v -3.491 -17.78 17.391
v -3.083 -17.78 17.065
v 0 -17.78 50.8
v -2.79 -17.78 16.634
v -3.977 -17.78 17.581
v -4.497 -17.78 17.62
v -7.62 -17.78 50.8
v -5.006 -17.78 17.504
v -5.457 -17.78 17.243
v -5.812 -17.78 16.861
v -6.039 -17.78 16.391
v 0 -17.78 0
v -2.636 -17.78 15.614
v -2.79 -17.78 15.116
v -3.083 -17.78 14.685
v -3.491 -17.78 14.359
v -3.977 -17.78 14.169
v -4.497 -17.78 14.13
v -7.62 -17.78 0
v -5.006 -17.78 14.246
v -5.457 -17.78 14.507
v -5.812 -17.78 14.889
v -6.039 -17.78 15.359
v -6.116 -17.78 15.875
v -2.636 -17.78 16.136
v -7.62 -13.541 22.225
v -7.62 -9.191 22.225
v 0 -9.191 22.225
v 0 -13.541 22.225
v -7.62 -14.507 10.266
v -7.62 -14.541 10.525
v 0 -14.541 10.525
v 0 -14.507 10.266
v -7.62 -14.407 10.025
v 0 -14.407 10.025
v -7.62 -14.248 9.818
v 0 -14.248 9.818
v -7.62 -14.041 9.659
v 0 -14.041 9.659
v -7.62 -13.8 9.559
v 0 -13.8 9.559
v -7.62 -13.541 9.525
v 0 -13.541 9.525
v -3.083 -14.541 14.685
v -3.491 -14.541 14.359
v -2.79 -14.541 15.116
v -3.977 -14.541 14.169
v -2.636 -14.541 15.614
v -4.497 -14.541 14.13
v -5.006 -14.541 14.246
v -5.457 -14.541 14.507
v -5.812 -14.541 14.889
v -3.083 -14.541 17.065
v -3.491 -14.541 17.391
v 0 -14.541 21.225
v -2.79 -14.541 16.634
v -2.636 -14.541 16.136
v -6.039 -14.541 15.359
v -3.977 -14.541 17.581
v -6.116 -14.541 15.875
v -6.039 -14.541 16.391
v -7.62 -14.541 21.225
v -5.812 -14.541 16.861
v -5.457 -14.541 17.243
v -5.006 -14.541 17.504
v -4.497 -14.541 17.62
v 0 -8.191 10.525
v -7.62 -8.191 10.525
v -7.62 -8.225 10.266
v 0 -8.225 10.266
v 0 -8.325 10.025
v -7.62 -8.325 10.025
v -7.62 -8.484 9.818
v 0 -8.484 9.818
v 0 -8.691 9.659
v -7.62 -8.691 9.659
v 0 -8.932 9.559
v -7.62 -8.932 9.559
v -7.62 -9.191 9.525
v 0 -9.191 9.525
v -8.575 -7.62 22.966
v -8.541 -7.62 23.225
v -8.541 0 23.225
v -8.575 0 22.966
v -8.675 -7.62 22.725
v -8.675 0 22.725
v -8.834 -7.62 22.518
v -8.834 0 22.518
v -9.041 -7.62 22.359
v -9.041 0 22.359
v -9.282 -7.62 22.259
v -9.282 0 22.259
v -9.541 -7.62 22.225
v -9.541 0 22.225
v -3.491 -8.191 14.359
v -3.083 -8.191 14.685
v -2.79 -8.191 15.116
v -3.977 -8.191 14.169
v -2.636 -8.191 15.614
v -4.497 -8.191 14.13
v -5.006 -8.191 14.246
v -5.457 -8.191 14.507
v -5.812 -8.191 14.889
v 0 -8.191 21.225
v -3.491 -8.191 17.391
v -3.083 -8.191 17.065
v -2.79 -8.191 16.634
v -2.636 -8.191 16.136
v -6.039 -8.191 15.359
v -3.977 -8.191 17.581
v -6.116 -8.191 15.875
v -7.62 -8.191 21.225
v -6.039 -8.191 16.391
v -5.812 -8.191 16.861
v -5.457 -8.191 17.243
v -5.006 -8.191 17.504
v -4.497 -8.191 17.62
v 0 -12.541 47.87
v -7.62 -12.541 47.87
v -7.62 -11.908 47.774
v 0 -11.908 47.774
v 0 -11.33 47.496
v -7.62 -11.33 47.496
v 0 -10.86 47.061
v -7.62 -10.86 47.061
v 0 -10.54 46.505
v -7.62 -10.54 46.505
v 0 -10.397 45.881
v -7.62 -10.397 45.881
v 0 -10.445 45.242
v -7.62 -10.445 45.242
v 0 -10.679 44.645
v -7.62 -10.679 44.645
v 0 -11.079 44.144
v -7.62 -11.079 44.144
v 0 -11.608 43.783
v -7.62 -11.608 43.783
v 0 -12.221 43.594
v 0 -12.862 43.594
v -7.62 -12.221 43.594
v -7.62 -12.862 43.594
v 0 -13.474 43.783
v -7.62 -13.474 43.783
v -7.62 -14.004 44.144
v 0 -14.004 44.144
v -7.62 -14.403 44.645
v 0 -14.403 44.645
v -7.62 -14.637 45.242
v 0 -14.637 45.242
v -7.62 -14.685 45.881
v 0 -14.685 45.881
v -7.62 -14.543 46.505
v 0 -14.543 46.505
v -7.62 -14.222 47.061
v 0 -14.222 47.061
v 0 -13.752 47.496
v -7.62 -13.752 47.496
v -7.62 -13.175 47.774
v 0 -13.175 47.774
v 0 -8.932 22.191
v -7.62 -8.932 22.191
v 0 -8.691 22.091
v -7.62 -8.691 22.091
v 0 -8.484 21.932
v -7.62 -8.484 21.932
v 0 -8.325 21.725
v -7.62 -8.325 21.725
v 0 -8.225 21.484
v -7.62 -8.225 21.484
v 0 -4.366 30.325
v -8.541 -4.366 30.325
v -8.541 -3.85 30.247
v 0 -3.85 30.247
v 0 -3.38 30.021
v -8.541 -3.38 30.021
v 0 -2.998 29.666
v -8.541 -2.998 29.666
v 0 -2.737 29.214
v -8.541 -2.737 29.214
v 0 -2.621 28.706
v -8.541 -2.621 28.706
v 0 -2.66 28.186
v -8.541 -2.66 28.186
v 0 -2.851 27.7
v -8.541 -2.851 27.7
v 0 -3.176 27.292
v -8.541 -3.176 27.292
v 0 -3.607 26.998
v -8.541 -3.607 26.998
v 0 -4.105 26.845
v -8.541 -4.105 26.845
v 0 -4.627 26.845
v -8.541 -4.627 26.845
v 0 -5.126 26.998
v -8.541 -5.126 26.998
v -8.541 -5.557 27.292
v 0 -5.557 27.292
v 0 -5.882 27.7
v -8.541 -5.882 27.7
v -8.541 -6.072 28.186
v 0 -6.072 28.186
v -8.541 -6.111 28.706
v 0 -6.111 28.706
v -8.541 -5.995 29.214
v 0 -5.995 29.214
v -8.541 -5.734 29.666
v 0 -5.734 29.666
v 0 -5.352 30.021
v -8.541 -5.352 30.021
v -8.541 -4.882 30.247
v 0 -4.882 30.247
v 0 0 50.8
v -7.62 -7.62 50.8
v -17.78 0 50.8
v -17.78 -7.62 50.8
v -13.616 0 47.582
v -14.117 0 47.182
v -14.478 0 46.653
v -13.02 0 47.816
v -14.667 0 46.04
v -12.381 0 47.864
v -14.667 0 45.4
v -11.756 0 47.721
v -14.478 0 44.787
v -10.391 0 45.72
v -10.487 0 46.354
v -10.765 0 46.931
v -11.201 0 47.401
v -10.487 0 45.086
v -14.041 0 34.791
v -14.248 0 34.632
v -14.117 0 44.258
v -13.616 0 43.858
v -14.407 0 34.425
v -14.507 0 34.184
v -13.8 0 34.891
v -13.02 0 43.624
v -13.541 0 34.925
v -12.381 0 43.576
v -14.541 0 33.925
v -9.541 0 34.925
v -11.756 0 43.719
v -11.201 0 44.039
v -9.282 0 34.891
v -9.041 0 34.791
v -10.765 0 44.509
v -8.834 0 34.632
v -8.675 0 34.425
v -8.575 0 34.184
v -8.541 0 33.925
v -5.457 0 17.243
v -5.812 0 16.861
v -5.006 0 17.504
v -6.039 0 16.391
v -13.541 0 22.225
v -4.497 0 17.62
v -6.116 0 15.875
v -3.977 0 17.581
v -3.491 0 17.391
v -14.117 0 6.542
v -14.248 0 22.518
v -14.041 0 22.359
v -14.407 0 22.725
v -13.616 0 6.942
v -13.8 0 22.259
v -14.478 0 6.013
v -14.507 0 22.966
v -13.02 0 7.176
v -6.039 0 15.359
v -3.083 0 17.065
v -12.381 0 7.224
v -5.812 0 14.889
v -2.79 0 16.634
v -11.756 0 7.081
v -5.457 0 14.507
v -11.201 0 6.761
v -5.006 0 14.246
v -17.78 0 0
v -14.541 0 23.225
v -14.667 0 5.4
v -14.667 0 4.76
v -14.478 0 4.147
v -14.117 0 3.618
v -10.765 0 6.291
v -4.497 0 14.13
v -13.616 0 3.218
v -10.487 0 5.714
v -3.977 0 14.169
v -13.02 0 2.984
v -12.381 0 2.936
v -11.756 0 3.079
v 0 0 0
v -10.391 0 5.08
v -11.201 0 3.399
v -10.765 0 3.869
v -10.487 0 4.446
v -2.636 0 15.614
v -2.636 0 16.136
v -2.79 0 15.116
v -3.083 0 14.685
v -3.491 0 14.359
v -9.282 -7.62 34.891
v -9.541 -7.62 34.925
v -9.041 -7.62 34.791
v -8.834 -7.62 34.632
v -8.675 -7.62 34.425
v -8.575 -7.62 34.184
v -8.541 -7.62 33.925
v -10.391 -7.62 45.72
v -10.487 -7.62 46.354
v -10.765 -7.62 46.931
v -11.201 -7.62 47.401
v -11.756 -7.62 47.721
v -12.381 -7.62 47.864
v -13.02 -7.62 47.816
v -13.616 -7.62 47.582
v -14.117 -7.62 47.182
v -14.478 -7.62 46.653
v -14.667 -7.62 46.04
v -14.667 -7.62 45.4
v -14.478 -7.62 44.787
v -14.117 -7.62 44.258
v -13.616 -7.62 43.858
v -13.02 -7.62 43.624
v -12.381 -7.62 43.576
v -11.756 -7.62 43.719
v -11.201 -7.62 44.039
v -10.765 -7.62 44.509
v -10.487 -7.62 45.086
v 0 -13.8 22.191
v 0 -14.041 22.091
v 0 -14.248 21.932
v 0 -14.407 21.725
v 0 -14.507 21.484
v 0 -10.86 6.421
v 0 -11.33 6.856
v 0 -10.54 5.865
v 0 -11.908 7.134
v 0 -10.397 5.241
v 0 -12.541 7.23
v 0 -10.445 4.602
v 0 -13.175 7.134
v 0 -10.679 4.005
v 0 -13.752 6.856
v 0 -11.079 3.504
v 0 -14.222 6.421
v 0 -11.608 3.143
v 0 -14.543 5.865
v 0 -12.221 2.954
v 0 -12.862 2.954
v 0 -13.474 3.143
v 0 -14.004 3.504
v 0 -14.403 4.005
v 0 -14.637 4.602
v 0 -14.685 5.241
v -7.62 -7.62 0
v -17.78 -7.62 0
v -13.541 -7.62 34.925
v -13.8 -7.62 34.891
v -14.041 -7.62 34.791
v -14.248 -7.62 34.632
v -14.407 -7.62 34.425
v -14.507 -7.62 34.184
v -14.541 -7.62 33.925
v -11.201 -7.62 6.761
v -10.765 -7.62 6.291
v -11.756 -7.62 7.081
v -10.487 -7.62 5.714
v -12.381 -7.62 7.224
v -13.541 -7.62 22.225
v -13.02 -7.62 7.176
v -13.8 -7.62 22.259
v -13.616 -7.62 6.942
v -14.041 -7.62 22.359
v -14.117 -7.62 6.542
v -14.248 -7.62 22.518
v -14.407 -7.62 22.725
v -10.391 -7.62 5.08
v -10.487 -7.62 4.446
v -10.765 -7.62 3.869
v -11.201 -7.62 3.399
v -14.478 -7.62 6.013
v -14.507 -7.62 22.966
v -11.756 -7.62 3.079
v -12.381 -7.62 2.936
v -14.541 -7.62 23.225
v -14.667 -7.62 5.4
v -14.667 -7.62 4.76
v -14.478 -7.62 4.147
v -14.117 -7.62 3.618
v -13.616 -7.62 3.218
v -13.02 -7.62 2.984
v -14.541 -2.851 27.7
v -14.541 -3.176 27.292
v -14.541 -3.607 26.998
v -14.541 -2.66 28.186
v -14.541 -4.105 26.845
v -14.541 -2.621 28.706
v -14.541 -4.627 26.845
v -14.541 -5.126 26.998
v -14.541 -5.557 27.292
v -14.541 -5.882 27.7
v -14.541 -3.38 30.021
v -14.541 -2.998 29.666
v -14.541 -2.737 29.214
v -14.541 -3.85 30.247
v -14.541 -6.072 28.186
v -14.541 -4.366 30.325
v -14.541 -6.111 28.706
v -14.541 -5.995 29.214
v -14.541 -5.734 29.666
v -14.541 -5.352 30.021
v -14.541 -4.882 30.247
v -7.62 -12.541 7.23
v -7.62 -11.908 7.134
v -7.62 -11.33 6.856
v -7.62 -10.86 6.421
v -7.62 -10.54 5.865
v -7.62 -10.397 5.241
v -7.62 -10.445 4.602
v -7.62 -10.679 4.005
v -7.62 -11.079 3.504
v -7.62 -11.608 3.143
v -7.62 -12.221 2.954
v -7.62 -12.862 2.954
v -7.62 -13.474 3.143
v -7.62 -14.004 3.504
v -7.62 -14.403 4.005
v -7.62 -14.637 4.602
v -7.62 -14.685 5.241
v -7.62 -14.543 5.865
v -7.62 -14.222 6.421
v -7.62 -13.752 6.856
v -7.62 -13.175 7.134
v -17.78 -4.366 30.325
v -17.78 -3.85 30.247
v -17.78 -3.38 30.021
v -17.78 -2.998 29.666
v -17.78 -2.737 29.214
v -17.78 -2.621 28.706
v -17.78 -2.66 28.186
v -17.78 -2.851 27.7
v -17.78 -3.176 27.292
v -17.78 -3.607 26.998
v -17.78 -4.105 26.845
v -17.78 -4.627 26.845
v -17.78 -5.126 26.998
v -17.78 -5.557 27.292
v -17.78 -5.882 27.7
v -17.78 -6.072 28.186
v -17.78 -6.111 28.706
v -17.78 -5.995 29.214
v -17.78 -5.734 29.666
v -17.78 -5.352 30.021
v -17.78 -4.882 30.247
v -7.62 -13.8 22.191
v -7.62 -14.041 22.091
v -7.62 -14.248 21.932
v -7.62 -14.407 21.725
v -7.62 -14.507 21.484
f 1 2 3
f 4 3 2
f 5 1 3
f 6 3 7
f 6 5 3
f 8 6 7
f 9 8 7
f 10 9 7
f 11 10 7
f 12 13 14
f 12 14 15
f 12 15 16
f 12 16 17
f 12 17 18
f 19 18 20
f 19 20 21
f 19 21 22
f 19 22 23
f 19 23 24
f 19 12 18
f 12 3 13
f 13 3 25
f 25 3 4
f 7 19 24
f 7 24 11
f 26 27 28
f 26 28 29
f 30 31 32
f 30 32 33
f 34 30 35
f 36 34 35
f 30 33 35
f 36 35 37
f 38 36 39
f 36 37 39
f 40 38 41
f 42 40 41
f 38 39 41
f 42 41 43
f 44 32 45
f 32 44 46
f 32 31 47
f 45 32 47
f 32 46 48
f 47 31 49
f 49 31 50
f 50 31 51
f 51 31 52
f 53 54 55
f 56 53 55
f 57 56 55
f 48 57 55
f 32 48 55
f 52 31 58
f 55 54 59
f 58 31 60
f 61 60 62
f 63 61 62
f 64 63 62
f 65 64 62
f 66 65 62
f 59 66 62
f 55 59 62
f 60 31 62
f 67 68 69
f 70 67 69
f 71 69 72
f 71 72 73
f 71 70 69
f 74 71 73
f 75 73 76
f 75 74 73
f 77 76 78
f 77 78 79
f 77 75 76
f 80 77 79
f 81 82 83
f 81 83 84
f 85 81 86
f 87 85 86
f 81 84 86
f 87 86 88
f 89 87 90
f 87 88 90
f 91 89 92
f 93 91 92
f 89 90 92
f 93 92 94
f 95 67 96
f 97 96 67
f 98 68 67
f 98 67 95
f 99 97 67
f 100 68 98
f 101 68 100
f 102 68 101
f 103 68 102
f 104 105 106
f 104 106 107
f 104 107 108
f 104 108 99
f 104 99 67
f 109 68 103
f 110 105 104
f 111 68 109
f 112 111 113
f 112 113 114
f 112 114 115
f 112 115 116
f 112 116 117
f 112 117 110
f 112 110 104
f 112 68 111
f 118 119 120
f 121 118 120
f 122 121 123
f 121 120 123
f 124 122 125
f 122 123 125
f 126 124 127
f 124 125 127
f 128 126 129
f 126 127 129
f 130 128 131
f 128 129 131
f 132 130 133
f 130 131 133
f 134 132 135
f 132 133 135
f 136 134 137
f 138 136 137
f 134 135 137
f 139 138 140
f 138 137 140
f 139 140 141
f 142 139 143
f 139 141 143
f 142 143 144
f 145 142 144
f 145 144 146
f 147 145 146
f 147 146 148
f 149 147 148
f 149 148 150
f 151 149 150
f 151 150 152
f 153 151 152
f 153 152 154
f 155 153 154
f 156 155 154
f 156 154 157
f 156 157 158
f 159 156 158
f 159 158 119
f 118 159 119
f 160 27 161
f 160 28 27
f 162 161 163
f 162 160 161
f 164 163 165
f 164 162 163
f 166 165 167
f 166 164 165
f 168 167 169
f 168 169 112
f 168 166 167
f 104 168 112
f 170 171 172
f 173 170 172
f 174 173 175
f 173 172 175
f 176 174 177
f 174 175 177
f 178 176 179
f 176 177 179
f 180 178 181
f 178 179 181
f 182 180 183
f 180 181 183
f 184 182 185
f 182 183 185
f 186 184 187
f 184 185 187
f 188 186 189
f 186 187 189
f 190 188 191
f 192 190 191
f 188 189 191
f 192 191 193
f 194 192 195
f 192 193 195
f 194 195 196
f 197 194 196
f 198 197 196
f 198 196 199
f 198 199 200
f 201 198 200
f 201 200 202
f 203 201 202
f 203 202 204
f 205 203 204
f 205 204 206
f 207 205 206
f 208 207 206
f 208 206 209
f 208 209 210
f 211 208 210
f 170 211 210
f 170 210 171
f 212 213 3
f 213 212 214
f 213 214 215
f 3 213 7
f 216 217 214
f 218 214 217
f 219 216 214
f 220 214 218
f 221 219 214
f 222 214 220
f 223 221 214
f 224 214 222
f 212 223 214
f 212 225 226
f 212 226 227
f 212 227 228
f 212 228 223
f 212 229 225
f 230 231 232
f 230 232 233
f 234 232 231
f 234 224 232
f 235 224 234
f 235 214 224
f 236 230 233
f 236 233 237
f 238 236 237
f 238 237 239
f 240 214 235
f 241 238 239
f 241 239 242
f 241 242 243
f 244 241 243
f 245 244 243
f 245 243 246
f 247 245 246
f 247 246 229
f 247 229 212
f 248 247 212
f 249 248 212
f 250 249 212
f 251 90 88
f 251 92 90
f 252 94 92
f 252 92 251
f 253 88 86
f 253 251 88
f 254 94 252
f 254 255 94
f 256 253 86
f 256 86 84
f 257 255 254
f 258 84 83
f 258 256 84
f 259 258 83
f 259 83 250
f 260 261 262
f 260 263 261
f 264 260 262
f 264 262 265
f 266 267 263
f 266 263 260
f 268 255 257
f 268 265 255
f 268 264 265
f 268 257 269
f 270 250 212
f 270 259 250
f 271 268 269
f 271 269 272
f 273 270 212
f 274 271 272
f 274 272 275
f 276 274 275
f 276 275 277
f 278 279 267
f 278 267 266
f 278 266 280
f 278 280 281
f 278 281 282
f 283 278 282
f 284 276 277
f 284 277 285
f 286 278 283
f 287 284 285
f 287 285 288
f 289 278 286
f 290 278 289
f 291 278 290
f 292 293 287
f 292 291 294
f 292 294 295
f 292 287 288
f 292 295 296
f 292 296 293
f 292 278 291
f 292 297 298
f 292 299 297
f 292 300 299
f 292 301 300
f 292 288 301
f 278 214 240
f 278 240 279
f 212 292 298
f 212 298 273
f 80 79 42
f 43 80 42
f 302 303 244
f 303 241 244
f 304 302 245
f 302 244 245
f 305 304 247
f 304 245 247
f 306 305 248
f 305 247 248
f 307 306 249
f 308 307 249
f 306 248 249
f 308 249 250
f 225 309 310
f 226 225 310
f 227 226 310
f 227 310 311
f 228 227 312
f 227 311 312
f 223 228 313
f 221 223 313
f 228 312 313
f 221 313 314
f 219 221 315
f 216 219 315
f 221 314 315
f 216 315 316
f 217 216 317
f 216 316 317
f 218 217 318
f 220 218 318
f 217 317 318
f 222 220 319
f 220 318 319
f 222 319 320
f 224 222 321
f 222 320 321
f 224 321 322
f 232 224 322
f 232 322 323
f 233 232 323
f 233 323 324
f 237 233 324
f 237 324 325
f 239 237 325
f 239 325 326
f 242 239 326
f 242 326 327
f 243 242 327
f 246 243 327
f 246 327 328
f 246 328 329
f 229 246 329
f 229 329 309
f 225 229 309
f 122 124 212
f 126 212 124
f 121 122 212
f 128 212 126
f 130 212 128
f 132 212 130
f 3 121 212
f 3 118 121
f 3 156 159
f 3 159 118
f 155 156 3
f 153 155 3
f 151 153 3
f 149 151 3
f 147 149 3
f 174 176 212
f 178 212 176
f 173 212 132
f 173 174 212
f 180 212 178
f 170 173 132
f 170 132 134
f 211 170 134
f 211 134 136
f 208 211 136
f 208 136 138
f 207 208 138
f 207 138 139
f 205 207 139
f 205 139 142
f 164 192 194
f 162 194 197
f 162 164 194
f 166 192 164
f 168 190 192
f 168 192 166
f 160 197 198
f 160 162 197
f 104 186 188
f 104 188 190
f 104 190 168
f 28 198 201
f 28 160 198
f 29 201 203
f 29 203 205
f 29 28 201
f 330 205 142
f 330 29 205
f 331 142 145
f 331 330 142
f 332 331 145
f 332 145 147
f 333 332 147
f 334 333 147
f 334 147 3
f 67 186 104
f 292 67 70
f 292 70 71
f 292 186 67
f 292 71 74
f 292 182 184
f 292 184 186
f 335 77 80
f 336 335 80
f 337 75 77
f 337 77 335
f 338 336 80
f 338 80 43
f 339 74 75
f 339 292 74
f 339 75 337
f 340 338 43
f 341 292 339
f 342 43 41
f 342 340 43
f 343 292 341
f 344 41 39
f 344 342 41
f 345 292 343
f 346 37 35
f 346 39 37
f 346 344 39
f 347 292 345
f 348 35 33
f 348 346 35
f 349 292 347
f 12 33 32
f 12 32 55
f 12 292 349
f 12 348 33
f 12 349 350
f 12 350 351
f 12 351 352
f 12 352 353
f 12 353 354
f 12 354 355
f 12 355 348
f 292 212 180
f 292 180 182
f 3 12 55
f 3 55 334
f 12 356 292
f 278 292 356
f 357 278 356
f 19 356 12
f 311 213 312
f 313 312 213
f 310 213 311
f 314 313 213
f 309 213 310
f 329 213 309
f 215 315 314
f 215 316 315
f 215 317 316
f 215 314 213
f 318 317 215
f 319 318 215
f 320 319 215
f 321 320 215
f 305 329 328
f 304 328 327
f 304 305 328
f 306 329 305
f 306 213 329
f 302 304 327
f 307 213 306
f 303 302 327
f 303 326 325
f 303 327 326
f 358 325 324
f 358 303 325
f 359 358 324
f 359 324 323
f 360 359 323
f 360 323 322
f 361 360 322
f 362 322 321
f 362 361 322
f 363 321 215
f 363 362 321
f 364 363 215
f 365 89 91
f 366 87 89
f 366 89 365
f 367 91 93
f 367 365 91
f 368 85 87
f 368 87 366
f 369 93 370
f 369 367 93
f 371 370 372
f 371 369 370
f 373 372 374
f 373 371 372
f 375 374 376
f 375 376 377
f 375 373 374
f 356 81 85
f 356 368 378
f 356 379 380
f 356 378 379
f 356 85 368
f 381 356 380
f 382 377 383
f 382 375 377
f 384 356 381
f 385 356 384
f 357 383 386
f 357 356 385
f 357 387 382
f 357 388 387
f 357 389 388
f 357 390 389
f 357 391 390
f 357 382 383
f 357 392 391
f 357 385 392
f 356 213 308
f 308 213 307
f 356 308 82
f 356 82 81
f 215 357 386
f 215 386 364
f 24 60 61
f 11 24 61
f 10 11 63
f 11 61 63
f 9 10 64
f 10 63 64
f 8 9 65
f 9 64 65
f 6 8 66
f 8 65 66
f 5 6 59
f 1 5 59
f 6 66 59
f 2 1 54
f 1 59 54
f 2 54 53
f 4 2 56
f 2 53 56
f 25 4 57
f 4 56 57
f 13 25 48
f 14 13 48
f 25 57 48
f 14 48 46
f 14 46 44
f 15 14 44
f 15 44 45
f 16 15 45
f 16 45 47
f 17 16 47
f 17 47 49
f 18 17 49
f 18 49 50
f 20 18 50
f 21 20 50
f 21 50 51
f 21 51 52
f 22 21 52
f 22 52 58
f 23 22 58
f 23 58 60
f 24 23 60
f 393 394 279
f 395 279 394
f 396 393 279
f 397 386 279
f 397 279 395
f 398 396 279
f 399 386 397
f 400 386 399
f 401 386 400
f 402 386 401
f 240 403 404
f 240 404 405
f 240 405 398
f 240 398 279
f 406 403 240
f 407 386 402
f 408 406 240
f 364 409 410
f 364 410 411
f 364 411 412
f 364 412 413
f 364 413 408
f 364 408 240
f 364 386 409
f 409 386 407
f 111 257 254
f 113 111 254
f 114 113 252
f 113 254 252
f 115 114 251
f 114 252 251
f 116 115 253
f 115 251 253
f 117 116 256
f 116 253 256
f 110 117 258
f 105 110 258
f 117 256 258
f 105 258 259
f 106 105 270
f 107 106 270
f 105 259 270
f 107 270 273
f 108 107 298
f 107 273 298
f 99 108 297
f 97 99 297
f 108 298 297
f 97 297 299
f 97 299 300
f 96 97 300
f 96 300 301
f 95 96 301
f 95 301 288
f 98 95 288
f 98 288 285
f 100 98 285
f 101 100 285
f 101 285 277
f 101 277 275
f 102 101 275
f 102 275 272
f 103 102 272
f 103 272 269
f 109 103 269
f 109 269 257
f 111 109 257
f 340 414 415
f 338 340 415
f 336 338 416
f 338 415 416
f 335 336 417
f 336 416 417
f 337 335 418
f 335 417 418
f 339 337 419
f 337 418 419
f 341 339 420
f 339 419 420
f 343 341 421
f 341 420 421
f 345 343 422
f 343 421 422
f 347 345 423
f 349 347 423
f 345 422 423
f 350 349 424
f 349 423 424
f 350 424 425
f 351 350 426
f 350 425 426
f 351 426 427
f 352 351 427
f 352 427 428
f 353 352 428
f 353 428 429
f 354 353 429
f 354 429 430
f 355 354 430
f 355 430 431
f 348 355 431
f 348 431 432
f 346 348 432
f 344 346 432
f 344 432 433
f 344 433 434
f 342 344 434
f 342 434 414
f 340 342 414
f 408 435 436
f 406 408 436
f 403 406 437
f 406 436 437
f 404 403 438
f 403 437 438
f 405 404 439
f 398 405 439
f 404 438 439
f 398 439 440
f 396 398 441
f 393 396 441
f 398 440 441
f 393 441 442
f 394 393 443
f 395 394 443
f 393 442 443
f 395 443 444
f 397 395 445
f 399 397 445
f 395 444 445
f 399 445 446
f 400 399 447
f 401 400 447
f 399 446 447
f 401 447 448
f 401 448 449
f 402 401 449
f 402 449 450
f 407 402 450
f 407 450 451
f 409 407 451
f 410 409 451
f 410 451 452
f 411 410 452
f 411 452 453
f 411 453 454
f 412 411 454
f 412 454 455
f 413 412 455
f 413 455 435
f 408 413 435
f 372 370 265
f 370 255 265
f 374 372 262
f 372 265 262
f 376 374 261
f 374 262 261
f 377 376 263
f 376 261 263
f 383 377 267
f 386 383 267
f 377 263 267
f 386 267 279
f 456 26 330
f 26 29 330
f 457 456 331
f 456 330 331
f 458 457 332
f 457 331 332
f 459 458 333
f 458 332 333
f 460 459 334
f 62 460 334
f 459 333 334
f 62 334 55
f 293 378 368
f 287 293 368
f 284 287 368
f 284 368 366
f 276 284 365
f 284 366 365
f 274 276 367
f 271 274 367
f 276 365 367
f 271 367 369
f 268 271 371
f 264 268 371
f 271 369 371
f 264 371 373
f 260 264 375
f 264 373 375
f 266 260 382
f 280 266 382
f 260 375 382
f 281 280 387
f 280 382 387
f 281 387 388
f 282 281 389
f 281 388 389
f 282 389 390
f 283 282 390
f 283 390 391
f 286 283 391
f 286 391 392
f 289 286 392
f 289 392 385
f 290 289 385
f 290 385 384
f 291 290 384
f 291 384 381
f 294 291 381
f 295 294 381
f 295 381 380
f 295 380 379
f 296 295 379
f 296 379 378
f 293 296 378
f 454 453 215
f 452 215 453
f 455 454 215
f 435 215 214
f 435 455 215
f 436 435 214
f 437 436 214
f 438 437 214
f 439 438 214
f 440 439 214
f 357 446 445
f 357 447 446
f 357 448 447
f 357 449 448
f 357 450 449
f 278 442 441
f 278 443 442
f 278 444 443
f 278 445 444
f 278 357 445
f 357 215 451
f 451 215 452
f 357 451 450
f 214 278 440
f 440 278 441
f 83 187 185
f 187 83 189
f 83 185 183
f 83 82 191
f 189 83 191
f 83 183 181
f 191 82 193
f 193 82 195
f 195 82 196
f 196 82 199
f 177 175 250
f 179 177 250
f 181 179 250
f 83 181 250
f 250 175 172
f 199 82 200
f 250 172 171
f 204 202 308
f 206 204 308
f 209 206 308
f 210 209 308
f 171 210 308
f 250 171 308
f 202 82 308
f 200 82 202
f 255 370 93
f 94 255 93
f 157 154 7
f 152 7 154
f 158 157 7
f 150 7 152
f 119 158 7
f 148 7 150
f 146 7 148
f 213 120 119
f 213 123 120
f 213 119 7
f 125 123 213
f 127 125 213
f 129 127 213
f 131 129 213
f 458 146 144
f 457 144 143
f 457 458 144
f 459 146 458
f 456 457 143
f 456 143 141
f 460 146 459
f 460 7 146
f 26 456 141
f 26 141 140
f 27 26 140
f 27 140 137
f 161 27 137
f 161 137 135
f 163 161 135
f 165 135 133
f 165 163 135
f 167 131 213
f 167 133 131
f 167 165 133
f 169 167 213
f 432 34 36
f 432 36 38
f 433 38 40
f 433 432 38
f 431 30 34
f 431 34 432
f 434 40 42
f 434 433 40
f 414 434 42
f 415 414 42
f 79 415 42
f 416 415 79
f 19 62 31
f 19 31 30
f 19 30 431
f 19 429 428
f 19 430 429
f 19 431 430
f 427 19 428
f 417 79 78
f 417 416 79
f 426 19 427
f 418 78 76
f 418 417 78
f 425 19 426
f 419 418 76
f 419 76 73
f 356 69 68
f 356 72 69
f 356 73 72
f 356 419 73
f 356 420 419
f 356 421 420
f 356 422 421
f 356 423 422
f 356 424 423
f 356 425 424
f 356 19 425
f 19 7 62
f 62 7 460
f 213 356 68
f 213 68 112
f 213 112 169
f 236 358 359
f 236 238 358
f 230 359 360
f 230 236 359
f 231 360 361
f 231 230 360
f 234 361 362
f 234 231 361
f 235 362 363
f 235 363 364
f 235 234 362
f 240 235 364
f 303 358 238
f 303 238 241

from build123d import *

# Parameters (mm, degrees)
BOSS_EXTRUDE2_DEPTH = 50.8
SKETCH3_R           = 1.75
CUT_EXTRUDE1_DEPTH  = 76.2
SKETCH4_R           = 2.15
SKETCH4_W           = 6.35
SKETCH4_H           = 12.7
CUT_EXTRUDE2_DEPTH  = 76.2
SKETCH6_R           = 1.75
CUT_EXTRUDE3_DEPTH  = 76.2
SKETCH7_R           = 2.15
SKETCH7_W           = 6
SKETCH7_H           = 12.7
CUT_EXTRUDE4_DEPTH  = 76.2
FILLET1_R           = 1


with BuildPart() as part:
    # Sketch2 → Boss-Extrude2 (new body)
    with BuildSketch(Plane(origin=(0, 0, 0), x_dir=(0, 1, 0), z_dir=(0, 0, 1))):
        Polygon((0, 0), (-17.78, 0), (-17.78, 7.62), (-7.62, 7.62), (-7.62, 17.78), (0, 17.78), align=None)
    extrude(amount=BOSS_EXTRUDE2_DEPTH)

    # Sketch3 → Cut-Extrude1 (cut)
    with BuildSketch(Plane(origin=(0, 0, 0), x_dir=(-1, 0, 0), z_dir=(0, 1, 0))):
        with Locations((4.36625, 15.875)):
            Circle(SKETCH3_R)
    extrude(amount=-CUT_EXTRUDE1_DEPTH, mode=Mode.SUBTRACT)

    # Sketch4 → Cut-Extrude2 (cut)
    with BuildSketch(Plane(origin=(-7.62, 0, 0), x_dir=(0, -1, 0), z_dir=(-1, 0, 0))):
        with Locations(Location((12.54125, 5.08, 0), (0, 0, 90))):
            Circle(SKETCH4_R)
        with Locations(Location((12.54125, 45.72, 0), (0, 0, 90))):
            Circle(SKETCH4_R)
        with Locations((11.366242, 15.875)):
            Rectangle(SKETCH4_W, SKETCH4_H)
    extrude(amount=-CUT_EXTRUDE2_DEPTH, mode=Mode.SUBTRACT)

    # Sketch6 → Cut-Extrude3 (cut)
    with BuildSketch(Plane(origin=(-17.78, 0, 0), x_dir=(0, -1, 0), z_dir=(-1, 0, 0))):
        with Locations(Location((4.36626, 28.575, 0), (0, 0, 90))):
            Circle(SKETCH6_R)
    extrude(amount=-CUT_EXTRUDE3_DEPTH, mode=Mode.SUBTRACT)

    # Sketch7 → Cut-Extrude4 (cut)
    with BuildSketch(Plane.XZ.offset(7.62)):
        with Locations((-12.54125, 45.72)):
            Circle(SKETCH7_R)
        with Locations((-12.54125, 5.08)):
            Circle(SKETCH7_R)
        with Locations((-11.541246, 28.575)):
            Rectangle(SKETCH7_W, SKETCH7_H)
    extrude(amount=-CUT_EXTRUDE4_DEPTH, mode=Mode.SUBTRACT)

    # Fillet1
    fillet1_edges = [part.edges().sort_by_distance(p)[0] for p in [
        (-3.81, -8.191242, 22.225),
        (-3.81, -14.541242, 9.525),
        (-3.81, -8.191242, 9.525),
        (-3.81, -14.541242, 22.225),
        (-14.541246, -3.81, 34.925),
        (-8.541246, -3.81, 22.225),
        (-14.541246, -3.81, 22.225),
        (-8.541246, -3.81, 34.925),
    ]]
    fillet(fillet1_edges, radius=FILLET1_R)


solid = part.part
